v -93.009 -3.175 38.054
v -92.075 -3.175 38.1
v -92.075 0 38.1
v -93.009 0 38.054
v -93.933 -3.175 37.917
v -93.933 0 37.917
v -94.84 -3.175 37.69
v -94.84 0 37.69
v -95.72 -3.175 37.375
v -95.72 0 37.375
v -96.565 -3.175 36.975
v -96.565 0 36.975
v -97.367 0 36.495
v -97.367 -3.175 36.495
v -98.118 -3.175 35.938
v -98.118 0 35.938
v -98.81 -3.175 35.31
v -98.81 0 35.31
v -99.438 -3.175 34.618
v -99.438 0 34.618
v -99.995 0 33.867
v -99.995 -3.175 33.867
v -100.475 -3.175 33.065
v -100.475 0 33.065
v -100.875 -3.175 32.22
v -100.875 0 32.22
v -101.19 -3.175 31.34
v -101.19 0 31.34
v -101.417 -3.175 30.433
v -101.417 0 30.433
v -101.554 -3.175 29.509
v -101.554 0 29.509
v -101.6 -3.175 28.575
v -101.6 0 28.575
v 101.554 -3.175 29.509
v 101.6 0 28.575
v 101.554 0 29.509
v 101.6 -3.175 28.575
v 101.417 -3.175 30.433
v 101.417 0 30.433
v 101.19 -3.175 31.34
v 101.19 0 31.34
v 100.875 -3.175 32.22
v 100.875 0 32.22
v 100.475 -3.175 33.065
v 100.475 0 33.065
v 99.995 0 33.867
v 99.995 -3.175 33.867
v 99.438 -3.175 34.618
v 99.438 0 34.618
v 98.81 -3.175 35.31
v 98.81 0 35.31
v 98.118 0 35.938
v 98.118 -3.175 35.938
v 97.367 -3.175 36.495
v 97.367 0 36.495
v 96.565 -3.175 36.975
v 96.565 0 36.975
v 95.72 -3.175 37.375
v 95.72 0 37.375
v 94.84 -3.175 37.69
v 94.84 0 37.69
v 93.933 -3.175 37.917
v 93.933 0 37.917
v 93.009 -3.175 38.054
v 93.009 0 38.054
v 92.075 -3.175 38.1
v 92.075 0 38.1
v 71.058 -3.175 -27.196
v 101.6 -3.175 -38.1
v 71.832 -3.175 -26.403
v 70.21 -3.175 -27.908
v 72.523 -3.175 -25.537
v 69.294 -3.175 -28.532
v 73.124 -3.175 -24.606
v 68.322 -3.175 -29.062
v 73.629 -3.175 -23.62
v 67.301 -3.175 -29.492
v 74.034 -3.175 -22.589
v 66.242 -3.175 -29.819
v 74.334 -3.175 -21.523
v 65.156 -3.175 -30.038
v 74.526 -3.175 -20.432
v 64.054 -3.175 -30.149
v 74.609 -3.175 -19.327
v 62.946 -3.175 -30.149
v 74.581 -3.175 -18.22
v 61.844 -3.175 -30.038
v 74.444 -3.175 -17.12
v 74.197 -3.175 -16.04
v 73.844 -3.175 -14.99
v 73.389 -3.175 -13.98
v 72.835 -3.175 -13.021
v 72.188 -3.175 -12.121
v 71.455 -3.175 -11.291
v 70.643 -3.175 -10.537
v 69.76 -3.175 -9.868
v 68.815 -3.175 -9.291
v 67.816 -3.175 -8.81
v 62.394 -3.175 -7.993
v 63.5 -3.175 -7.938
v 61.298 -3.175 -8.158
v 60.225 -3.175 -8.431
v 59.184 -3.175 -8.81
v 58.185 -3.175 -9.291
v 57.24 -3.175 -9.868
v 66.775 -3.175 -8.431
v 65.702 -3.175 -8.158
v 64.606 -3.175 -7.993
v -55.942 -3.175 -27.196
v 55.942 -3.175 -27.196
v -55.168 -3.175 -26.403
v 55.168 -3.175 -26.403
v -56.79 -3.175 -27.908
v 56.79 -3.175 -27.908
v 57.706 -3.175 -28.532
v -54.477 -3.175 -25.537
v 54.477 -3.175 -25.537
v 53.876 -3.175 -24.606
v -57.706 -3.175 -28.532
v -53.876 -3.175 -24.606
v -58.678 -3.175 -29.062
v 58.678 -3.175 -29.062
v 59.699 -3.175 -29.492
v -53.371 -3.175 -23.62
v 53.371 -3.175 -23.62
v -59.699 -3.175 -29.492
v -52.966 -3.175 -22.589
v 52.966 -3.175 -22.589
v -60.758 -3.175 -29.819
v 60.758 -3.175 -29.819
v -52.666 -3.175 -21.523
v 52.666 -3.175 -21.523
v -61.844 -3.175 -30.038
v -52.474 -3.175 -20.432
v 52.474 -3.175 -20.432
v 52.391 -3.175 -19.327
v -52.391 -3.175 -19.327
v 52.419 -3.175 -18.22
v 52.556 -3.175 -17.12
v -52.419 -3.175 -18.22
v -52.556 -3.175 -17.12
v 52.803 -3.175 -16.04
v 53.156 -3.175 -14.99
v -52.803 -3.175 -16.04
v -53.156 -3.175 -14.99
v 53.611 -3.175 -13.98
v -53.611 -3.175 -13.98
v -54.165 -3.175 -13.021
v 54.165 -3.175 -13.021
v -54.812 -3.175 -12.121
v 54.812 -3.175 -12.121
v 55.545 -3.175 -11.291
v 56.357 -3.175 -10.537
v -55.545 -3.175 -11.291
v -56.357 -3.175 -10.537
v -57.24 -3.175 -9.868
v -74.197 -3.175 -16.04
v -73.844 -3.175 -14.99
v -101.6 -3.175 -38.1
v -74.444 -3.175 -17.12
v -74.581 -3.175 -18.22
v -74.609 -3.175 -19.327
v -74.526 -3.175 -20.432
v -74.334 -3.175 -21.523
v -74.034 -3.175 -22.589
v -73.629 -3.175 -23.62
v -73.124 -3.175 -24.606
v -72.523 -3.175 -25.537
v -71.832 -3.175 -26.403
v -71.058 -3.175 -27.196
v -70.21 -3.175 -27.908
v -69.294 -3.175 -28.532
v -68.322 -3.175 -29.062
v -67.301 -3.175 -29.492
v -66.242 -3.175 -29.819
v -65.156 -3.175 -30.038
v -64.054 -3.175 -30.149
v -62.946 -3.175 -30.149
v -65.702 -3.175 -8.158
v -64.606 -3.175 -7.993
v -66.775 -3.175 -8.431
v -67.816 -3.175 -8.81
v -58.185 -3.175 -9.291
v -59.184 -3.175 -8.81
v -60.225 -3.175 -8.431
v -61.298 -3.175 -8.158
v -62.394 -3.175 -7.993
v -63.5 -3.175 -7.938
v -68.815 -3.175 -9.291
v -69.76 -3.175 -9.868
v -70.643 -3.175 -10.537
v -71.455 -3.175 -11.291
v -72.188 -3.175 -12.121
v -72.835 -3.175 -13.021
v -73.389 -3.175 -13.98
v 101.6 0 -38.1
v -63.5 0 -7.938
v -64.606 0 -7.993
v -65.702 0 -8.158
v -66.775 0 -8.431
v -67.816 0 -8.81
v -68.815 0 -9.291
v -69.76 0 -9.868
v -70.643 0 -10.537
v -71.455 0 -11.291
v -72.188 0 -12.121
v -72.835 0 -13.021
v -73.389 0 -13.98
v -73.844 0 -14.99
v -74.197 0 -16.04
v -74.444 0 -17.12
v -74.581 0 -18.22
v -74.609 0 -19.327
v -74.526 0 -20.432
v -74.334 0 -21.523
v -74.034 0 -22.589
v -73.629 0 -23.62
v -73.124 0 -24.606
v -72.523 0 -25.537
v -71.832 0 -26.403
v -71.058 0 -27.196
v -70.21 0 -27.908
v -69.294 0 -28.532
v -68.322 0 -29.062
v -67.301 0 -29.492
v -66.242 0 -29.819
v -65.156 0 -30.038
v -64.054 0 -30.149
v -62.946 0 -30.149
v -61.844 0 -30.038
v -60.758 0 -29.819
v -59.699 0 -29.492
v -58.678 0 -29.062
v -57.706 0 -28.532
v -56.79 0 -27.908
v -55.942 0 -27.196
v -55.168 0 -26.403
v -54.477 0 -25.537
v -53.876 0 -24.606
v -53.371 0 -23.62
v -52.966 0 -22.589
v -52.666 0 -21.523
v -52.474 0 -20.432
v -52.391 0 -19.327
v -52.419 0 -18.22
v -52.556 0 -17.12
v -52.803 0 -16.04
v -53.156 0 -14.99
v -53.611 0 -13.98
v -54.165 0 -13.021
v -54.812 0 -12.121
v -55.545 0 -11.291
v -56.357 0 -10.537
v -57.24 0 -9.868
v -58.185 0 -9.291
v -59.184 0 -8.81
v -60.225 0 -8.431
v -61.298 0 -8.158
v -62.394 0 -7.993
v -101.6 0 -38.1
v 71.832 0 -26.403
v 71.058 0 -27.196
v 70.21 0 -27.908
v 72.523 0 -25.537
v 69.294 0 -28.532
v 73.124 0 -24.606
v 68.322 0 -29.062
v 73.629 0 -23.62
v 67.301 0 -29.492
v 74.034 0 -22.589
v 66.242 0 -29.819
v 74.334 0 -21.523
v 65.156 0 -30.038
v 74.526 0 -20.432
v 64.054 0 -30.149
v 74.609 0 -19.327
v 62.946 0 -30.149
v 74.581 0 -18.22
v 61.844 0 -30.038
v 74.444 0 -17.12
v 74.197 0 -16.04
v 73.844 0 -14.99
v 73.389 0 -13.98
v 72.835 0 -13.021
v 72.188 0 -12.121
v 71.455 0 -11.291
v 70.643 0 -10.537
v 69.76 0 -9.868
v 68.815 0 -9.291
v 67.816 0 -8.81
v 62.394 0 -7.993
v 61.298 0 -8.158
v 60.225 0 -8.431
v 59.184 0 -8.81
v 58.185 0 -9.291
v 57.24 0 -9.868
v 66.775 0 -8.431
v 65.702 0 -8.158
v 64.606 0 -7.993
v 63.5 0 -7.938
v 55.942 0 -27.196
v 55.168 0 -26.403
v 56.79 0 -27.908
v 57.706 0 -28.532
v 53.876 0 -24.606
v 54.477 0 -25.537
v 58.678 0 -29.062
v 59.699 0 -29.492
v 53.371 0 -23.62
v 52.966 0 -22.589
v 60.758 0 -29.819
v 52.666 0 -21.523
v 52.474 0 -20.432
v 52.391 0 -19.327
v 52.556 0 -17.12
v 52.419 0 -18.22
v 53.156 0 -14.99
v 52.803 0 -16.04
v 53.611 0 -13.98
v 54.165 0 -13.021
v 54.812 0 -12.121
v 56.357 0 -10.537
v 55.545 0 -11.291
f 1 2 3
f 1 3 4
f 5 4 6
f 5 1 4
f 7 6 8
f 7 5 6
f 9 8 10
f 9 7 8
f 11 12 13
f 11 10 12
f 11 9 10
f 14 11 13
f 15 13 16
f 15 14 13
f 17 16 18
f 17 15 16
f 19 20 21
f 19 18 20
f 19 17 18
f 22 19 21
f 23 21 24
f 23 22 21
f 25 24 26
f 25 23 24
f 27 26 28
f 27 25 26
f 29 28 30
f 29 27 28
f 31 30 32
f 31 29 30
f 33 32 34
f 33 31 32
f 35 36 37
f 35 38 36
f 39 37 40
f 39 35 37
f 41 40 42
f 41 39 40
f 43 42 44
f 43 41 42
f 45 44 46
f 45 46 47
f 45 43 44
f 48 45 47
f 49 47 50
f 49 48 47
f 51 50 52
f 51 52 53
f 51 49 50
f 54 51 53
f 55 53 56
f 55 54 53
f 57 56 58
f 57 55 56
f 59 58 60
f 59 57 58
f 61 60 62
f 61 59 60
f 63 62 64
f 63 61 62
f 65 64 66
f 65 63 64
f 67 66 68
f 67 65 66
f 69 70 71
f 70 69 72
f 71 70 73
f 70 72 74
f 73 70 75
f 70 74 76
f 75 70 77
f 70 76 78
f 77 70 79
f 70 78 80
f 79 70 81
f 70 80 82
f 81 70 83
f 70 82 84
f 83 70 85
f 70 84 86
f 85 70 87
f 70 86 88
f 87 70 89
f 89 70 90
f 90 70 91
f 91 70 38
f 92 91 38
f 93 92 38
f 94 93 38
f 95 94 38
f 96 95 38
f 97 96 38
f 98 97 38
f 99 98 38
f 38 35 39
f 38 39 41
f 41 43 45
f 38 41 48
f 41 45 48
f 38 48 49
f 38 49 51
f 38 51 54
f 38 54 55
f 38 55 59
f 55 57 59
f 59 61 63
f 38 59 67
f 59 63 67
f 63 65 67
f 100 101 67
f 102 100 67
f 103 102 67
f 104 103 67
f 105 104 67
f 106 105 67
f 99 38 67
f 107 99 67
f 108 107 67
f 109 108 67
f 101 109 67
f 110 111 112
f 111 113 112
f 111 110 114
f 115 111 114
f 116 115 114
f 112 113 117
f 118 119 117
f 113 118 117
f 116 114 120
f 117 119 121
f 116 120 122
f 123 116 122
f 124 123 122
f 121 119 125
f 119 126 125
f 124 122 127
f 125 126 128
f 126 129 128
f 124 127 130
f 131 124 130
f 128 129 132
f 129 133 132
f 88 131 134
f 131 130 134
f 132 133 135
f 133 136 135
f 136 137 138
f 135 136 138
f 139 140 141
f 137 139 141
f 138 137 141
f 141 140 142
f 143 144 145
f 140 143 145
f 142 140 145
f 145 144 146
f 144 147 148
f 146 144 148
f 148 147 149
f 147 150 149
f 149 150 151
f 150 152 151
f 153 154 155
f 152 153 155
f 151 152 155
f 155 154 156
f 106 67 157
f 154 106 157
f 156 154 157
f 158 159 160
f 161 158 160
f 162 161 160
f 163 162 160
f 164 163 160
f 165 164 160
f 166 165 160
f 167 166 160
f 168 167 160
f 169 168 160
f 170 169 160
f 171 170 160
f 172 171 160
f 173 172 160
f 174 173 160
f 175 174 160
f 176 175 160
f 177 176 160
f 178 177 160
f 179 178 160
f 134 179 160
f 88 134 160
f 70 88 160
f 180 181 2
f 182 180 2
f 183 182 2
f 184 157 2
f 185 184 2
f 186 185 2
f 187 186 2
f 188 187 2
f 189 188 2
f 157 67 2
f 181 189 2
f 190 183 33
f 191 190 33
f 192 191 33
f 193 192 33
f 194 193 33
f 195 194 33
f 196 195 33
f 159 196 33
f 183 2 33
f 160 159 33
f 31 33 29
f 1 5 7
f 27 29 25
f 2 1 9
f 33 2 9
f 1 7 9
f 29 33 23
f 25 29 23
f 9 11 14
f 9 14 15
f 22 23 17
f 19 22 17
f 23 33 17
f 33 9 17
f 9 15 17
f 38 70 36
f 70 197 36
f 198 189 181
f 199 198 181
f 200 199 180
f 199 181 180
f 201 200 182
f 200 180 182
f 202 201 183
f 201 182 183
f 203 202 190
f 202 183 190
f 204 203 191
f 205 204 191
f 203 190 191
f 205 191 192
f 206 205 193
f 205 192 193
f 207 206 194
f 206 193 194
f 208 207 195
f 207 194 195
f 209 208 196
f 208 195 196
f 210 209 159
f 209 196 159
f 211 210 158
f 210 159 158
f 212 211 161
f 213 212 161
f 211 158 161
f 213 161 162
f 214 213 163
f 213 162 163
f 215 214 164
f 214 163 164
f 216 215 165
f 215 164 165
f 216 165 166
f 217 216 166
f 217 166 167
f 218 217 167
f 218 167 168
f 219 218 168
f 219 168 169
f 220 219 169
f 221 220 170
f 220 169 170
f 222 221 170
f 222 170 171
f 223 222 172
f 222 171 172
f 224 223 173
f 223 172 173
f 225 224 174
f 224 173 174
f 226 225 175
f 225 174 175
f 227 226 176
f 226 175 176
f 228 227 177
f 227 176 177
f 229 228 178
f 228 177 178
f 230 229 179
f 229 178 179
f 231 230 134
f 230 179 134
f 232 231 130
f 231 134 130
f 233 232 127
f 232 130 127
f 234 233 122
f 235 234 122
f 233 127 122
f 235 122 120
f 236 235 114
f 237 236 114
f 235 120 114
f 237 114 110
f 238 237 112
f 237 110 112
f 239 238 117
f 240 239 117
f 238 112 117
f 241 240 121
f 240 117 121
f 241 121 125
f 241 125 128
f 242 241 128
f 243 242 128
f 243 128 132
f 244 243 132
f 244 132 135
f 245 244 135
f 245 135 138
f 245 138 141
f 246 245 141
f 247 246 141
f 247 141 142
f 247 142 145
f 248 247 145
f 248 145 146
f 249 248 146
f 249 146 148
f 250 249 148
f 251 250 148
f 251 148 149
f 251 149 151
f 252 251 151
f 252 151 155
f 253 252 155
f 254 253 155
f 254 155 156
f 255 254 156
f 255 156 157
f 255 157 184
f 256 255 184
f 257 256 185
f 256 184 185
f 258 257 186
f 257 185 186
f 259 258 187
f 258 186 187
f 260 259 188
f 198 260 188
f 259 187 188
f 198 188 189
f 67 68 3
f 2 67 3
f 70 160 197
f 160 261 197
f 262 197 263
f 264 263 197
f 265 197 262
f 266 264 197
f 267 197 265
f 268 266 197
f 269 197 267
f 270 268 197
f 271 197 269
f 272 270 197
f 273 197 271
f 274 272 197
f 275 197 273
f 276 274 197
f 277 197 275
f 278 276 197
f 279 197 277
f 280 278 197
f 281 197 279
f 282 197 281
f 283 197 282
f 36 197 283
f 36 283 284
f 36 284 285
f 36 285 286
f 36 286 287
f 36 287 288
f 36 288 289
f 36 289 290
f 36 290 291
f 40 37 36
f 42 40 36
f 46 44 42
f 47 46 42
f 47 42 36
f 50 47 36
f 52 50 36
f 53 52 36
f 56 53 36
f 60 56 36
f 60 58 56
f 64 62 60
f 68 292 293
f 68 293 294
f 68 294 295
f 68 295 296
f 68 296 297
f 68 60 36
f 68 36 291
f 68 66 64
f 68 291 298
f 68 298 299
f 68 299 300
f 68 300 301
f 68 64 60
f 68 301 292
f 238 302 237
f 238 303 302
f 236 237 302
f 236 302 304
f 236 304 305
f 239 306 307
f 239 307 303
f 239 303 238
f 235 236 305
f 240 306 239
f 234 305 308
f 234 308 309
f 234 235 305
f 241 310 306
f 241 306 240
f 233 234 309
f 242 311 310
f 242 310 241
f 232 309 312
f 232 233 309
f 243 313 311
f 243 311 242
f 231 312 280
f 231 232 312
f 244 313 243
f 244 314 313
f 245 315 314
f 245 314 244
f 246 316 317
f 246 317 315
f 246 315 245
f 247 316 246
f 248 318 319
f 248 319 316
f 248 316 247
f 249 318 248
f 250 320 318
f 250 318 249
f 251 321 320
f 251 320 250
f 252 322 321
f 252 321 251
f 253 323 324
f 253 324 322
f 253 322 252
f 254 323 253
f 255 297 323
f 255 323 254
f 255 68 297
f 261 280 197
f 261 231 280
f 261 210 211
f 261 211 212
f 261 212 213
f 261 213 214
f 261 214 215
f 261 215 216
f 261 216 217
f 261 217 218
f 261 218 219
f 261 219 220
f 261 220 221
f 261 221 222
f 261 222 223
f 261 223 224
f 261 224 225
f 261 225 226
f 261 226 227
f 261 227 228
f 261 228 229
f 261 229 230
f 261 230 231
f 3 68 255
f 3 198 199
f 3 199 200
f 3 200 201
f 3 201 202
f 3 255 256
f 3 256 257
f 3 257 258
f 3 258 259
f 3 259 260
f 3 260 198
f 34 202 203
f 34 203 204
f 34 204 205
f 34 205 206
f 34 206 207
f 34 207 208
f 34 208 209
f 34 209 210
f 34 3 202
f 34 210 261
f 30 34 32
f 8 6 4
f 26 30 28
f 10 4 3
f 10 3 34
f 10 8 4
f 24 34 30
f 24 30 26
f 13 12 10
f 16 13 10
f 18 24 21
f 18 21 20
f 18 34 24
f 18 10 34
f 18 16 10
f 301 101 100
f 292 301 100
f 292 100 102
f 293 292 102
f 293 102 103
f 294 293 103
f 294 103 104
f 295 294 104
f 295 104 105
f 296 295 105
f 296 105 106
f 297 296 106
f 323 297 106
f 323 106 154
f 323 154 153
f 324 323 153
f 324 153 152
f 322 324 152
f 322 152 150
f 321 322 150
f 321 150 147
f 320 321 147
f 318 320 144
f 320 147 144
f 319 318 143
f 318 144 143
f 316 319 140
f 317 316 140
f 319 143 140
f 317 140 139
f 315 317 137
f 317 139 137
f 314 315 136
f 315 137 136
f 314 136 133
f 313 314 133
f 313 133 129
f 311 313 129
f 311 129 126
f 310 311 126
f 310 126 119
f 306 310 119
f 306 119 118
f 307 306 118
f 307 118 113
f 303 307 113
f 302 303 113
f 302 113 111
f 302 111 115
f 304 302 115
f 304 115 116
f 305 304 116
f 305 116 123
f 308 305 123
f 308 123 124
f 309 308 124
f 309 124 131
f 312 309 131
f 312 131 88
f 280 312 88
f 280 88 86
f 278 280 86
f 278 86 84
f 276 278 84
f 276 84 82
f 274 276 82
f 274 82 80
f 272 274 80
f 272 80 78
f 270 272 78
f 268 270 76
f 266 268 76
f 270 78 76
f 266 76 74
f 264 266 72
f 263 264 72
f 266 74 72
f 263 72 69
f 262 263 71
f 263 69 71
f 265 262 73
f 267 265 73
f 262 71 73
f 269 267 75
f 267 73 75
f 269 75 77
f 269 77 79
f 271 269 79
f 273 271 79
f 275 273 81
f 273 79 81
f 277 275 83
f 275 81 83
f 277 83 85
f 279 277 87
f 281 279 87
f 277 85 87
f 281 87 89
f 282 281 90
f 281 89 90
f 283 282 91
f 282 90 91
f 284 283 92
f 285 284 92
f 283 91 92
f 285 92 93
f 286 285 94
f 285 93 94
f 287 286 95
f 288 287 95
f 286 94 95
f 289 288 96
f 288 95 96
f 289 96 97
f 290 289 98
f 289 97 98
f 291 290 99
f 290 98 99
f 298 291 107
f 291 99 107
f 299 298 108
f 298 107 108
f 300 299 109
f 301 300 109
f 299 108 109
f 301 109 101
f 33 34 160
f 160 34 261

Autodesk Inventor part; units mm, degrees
ref_plane "YZ Plane" through (0, 0, 0) normal (1, 0, 0) x (0, 1, 0)
ref_plane "XZ Plane" through (0, 0, 0) normal (0, 1, 0) x (-1, 0, 0)
ref_plane "XY Plane" through (0, 0, 0) normal (0, 0, 1) x (1, 0, 0)
sketch "Sketch1" plane through (0, 0, 0) normal (0, 1, 0) x (-1, 0, 0)
  line L0 (101.6, -38.1) -> (-101.6, -38.1)
  line L1 (-101.6, -38.1) -> (-101.6, 38.1)
  line L2 (-101.6, 38.1) -> (101.6, 38.1)
  line L3 (101.6, 38.1) -> (101.6, -38.1)
  line L4 (101.6, -38.1) -> (-101.6, 38.1) construction
  line L5 (-101.6, -38.1) -> (101.6, 38.1) construction
  point P0 (0, 0)
  dimension "d0" = 203.2
  dimension "d1" = 76.2
extrude "Extrusion1" add sketch "Sketch1" against normal blind 3.175
sketch "Sketch2" plane through (0, 0, 0) normal (0, 1, 0) x (1, 0, 0)
  line L0 (-101.6, 38.1) -> (101.6, 38.1) construction
  line L1 (0, 38.1) -> (0, -38.1) construction
  line L2 (101.6, -38.1) -> (-101.6, -38.1) construction
  point P0 (0, 0)
  point P1 (-63.5, 19.05)
  point P2 (0, 0)
  point P3 (63.5, 19.05)
  dimension "d4" = 19.05
  dimension "d5" = 63.5
hole "Hole1" at (-63.5, 0, -19.05) at (63.5, 0, -19.05) direction (0, -1, 0) diameter 22.225 end through all
fillet "Fillet1" radius 9.525 2 edges at (101.6, -1.5875, 38.1) (-101.6, -1.5875, 38.1)
properties part number "GP2-002" material "Aluminum 6061"
